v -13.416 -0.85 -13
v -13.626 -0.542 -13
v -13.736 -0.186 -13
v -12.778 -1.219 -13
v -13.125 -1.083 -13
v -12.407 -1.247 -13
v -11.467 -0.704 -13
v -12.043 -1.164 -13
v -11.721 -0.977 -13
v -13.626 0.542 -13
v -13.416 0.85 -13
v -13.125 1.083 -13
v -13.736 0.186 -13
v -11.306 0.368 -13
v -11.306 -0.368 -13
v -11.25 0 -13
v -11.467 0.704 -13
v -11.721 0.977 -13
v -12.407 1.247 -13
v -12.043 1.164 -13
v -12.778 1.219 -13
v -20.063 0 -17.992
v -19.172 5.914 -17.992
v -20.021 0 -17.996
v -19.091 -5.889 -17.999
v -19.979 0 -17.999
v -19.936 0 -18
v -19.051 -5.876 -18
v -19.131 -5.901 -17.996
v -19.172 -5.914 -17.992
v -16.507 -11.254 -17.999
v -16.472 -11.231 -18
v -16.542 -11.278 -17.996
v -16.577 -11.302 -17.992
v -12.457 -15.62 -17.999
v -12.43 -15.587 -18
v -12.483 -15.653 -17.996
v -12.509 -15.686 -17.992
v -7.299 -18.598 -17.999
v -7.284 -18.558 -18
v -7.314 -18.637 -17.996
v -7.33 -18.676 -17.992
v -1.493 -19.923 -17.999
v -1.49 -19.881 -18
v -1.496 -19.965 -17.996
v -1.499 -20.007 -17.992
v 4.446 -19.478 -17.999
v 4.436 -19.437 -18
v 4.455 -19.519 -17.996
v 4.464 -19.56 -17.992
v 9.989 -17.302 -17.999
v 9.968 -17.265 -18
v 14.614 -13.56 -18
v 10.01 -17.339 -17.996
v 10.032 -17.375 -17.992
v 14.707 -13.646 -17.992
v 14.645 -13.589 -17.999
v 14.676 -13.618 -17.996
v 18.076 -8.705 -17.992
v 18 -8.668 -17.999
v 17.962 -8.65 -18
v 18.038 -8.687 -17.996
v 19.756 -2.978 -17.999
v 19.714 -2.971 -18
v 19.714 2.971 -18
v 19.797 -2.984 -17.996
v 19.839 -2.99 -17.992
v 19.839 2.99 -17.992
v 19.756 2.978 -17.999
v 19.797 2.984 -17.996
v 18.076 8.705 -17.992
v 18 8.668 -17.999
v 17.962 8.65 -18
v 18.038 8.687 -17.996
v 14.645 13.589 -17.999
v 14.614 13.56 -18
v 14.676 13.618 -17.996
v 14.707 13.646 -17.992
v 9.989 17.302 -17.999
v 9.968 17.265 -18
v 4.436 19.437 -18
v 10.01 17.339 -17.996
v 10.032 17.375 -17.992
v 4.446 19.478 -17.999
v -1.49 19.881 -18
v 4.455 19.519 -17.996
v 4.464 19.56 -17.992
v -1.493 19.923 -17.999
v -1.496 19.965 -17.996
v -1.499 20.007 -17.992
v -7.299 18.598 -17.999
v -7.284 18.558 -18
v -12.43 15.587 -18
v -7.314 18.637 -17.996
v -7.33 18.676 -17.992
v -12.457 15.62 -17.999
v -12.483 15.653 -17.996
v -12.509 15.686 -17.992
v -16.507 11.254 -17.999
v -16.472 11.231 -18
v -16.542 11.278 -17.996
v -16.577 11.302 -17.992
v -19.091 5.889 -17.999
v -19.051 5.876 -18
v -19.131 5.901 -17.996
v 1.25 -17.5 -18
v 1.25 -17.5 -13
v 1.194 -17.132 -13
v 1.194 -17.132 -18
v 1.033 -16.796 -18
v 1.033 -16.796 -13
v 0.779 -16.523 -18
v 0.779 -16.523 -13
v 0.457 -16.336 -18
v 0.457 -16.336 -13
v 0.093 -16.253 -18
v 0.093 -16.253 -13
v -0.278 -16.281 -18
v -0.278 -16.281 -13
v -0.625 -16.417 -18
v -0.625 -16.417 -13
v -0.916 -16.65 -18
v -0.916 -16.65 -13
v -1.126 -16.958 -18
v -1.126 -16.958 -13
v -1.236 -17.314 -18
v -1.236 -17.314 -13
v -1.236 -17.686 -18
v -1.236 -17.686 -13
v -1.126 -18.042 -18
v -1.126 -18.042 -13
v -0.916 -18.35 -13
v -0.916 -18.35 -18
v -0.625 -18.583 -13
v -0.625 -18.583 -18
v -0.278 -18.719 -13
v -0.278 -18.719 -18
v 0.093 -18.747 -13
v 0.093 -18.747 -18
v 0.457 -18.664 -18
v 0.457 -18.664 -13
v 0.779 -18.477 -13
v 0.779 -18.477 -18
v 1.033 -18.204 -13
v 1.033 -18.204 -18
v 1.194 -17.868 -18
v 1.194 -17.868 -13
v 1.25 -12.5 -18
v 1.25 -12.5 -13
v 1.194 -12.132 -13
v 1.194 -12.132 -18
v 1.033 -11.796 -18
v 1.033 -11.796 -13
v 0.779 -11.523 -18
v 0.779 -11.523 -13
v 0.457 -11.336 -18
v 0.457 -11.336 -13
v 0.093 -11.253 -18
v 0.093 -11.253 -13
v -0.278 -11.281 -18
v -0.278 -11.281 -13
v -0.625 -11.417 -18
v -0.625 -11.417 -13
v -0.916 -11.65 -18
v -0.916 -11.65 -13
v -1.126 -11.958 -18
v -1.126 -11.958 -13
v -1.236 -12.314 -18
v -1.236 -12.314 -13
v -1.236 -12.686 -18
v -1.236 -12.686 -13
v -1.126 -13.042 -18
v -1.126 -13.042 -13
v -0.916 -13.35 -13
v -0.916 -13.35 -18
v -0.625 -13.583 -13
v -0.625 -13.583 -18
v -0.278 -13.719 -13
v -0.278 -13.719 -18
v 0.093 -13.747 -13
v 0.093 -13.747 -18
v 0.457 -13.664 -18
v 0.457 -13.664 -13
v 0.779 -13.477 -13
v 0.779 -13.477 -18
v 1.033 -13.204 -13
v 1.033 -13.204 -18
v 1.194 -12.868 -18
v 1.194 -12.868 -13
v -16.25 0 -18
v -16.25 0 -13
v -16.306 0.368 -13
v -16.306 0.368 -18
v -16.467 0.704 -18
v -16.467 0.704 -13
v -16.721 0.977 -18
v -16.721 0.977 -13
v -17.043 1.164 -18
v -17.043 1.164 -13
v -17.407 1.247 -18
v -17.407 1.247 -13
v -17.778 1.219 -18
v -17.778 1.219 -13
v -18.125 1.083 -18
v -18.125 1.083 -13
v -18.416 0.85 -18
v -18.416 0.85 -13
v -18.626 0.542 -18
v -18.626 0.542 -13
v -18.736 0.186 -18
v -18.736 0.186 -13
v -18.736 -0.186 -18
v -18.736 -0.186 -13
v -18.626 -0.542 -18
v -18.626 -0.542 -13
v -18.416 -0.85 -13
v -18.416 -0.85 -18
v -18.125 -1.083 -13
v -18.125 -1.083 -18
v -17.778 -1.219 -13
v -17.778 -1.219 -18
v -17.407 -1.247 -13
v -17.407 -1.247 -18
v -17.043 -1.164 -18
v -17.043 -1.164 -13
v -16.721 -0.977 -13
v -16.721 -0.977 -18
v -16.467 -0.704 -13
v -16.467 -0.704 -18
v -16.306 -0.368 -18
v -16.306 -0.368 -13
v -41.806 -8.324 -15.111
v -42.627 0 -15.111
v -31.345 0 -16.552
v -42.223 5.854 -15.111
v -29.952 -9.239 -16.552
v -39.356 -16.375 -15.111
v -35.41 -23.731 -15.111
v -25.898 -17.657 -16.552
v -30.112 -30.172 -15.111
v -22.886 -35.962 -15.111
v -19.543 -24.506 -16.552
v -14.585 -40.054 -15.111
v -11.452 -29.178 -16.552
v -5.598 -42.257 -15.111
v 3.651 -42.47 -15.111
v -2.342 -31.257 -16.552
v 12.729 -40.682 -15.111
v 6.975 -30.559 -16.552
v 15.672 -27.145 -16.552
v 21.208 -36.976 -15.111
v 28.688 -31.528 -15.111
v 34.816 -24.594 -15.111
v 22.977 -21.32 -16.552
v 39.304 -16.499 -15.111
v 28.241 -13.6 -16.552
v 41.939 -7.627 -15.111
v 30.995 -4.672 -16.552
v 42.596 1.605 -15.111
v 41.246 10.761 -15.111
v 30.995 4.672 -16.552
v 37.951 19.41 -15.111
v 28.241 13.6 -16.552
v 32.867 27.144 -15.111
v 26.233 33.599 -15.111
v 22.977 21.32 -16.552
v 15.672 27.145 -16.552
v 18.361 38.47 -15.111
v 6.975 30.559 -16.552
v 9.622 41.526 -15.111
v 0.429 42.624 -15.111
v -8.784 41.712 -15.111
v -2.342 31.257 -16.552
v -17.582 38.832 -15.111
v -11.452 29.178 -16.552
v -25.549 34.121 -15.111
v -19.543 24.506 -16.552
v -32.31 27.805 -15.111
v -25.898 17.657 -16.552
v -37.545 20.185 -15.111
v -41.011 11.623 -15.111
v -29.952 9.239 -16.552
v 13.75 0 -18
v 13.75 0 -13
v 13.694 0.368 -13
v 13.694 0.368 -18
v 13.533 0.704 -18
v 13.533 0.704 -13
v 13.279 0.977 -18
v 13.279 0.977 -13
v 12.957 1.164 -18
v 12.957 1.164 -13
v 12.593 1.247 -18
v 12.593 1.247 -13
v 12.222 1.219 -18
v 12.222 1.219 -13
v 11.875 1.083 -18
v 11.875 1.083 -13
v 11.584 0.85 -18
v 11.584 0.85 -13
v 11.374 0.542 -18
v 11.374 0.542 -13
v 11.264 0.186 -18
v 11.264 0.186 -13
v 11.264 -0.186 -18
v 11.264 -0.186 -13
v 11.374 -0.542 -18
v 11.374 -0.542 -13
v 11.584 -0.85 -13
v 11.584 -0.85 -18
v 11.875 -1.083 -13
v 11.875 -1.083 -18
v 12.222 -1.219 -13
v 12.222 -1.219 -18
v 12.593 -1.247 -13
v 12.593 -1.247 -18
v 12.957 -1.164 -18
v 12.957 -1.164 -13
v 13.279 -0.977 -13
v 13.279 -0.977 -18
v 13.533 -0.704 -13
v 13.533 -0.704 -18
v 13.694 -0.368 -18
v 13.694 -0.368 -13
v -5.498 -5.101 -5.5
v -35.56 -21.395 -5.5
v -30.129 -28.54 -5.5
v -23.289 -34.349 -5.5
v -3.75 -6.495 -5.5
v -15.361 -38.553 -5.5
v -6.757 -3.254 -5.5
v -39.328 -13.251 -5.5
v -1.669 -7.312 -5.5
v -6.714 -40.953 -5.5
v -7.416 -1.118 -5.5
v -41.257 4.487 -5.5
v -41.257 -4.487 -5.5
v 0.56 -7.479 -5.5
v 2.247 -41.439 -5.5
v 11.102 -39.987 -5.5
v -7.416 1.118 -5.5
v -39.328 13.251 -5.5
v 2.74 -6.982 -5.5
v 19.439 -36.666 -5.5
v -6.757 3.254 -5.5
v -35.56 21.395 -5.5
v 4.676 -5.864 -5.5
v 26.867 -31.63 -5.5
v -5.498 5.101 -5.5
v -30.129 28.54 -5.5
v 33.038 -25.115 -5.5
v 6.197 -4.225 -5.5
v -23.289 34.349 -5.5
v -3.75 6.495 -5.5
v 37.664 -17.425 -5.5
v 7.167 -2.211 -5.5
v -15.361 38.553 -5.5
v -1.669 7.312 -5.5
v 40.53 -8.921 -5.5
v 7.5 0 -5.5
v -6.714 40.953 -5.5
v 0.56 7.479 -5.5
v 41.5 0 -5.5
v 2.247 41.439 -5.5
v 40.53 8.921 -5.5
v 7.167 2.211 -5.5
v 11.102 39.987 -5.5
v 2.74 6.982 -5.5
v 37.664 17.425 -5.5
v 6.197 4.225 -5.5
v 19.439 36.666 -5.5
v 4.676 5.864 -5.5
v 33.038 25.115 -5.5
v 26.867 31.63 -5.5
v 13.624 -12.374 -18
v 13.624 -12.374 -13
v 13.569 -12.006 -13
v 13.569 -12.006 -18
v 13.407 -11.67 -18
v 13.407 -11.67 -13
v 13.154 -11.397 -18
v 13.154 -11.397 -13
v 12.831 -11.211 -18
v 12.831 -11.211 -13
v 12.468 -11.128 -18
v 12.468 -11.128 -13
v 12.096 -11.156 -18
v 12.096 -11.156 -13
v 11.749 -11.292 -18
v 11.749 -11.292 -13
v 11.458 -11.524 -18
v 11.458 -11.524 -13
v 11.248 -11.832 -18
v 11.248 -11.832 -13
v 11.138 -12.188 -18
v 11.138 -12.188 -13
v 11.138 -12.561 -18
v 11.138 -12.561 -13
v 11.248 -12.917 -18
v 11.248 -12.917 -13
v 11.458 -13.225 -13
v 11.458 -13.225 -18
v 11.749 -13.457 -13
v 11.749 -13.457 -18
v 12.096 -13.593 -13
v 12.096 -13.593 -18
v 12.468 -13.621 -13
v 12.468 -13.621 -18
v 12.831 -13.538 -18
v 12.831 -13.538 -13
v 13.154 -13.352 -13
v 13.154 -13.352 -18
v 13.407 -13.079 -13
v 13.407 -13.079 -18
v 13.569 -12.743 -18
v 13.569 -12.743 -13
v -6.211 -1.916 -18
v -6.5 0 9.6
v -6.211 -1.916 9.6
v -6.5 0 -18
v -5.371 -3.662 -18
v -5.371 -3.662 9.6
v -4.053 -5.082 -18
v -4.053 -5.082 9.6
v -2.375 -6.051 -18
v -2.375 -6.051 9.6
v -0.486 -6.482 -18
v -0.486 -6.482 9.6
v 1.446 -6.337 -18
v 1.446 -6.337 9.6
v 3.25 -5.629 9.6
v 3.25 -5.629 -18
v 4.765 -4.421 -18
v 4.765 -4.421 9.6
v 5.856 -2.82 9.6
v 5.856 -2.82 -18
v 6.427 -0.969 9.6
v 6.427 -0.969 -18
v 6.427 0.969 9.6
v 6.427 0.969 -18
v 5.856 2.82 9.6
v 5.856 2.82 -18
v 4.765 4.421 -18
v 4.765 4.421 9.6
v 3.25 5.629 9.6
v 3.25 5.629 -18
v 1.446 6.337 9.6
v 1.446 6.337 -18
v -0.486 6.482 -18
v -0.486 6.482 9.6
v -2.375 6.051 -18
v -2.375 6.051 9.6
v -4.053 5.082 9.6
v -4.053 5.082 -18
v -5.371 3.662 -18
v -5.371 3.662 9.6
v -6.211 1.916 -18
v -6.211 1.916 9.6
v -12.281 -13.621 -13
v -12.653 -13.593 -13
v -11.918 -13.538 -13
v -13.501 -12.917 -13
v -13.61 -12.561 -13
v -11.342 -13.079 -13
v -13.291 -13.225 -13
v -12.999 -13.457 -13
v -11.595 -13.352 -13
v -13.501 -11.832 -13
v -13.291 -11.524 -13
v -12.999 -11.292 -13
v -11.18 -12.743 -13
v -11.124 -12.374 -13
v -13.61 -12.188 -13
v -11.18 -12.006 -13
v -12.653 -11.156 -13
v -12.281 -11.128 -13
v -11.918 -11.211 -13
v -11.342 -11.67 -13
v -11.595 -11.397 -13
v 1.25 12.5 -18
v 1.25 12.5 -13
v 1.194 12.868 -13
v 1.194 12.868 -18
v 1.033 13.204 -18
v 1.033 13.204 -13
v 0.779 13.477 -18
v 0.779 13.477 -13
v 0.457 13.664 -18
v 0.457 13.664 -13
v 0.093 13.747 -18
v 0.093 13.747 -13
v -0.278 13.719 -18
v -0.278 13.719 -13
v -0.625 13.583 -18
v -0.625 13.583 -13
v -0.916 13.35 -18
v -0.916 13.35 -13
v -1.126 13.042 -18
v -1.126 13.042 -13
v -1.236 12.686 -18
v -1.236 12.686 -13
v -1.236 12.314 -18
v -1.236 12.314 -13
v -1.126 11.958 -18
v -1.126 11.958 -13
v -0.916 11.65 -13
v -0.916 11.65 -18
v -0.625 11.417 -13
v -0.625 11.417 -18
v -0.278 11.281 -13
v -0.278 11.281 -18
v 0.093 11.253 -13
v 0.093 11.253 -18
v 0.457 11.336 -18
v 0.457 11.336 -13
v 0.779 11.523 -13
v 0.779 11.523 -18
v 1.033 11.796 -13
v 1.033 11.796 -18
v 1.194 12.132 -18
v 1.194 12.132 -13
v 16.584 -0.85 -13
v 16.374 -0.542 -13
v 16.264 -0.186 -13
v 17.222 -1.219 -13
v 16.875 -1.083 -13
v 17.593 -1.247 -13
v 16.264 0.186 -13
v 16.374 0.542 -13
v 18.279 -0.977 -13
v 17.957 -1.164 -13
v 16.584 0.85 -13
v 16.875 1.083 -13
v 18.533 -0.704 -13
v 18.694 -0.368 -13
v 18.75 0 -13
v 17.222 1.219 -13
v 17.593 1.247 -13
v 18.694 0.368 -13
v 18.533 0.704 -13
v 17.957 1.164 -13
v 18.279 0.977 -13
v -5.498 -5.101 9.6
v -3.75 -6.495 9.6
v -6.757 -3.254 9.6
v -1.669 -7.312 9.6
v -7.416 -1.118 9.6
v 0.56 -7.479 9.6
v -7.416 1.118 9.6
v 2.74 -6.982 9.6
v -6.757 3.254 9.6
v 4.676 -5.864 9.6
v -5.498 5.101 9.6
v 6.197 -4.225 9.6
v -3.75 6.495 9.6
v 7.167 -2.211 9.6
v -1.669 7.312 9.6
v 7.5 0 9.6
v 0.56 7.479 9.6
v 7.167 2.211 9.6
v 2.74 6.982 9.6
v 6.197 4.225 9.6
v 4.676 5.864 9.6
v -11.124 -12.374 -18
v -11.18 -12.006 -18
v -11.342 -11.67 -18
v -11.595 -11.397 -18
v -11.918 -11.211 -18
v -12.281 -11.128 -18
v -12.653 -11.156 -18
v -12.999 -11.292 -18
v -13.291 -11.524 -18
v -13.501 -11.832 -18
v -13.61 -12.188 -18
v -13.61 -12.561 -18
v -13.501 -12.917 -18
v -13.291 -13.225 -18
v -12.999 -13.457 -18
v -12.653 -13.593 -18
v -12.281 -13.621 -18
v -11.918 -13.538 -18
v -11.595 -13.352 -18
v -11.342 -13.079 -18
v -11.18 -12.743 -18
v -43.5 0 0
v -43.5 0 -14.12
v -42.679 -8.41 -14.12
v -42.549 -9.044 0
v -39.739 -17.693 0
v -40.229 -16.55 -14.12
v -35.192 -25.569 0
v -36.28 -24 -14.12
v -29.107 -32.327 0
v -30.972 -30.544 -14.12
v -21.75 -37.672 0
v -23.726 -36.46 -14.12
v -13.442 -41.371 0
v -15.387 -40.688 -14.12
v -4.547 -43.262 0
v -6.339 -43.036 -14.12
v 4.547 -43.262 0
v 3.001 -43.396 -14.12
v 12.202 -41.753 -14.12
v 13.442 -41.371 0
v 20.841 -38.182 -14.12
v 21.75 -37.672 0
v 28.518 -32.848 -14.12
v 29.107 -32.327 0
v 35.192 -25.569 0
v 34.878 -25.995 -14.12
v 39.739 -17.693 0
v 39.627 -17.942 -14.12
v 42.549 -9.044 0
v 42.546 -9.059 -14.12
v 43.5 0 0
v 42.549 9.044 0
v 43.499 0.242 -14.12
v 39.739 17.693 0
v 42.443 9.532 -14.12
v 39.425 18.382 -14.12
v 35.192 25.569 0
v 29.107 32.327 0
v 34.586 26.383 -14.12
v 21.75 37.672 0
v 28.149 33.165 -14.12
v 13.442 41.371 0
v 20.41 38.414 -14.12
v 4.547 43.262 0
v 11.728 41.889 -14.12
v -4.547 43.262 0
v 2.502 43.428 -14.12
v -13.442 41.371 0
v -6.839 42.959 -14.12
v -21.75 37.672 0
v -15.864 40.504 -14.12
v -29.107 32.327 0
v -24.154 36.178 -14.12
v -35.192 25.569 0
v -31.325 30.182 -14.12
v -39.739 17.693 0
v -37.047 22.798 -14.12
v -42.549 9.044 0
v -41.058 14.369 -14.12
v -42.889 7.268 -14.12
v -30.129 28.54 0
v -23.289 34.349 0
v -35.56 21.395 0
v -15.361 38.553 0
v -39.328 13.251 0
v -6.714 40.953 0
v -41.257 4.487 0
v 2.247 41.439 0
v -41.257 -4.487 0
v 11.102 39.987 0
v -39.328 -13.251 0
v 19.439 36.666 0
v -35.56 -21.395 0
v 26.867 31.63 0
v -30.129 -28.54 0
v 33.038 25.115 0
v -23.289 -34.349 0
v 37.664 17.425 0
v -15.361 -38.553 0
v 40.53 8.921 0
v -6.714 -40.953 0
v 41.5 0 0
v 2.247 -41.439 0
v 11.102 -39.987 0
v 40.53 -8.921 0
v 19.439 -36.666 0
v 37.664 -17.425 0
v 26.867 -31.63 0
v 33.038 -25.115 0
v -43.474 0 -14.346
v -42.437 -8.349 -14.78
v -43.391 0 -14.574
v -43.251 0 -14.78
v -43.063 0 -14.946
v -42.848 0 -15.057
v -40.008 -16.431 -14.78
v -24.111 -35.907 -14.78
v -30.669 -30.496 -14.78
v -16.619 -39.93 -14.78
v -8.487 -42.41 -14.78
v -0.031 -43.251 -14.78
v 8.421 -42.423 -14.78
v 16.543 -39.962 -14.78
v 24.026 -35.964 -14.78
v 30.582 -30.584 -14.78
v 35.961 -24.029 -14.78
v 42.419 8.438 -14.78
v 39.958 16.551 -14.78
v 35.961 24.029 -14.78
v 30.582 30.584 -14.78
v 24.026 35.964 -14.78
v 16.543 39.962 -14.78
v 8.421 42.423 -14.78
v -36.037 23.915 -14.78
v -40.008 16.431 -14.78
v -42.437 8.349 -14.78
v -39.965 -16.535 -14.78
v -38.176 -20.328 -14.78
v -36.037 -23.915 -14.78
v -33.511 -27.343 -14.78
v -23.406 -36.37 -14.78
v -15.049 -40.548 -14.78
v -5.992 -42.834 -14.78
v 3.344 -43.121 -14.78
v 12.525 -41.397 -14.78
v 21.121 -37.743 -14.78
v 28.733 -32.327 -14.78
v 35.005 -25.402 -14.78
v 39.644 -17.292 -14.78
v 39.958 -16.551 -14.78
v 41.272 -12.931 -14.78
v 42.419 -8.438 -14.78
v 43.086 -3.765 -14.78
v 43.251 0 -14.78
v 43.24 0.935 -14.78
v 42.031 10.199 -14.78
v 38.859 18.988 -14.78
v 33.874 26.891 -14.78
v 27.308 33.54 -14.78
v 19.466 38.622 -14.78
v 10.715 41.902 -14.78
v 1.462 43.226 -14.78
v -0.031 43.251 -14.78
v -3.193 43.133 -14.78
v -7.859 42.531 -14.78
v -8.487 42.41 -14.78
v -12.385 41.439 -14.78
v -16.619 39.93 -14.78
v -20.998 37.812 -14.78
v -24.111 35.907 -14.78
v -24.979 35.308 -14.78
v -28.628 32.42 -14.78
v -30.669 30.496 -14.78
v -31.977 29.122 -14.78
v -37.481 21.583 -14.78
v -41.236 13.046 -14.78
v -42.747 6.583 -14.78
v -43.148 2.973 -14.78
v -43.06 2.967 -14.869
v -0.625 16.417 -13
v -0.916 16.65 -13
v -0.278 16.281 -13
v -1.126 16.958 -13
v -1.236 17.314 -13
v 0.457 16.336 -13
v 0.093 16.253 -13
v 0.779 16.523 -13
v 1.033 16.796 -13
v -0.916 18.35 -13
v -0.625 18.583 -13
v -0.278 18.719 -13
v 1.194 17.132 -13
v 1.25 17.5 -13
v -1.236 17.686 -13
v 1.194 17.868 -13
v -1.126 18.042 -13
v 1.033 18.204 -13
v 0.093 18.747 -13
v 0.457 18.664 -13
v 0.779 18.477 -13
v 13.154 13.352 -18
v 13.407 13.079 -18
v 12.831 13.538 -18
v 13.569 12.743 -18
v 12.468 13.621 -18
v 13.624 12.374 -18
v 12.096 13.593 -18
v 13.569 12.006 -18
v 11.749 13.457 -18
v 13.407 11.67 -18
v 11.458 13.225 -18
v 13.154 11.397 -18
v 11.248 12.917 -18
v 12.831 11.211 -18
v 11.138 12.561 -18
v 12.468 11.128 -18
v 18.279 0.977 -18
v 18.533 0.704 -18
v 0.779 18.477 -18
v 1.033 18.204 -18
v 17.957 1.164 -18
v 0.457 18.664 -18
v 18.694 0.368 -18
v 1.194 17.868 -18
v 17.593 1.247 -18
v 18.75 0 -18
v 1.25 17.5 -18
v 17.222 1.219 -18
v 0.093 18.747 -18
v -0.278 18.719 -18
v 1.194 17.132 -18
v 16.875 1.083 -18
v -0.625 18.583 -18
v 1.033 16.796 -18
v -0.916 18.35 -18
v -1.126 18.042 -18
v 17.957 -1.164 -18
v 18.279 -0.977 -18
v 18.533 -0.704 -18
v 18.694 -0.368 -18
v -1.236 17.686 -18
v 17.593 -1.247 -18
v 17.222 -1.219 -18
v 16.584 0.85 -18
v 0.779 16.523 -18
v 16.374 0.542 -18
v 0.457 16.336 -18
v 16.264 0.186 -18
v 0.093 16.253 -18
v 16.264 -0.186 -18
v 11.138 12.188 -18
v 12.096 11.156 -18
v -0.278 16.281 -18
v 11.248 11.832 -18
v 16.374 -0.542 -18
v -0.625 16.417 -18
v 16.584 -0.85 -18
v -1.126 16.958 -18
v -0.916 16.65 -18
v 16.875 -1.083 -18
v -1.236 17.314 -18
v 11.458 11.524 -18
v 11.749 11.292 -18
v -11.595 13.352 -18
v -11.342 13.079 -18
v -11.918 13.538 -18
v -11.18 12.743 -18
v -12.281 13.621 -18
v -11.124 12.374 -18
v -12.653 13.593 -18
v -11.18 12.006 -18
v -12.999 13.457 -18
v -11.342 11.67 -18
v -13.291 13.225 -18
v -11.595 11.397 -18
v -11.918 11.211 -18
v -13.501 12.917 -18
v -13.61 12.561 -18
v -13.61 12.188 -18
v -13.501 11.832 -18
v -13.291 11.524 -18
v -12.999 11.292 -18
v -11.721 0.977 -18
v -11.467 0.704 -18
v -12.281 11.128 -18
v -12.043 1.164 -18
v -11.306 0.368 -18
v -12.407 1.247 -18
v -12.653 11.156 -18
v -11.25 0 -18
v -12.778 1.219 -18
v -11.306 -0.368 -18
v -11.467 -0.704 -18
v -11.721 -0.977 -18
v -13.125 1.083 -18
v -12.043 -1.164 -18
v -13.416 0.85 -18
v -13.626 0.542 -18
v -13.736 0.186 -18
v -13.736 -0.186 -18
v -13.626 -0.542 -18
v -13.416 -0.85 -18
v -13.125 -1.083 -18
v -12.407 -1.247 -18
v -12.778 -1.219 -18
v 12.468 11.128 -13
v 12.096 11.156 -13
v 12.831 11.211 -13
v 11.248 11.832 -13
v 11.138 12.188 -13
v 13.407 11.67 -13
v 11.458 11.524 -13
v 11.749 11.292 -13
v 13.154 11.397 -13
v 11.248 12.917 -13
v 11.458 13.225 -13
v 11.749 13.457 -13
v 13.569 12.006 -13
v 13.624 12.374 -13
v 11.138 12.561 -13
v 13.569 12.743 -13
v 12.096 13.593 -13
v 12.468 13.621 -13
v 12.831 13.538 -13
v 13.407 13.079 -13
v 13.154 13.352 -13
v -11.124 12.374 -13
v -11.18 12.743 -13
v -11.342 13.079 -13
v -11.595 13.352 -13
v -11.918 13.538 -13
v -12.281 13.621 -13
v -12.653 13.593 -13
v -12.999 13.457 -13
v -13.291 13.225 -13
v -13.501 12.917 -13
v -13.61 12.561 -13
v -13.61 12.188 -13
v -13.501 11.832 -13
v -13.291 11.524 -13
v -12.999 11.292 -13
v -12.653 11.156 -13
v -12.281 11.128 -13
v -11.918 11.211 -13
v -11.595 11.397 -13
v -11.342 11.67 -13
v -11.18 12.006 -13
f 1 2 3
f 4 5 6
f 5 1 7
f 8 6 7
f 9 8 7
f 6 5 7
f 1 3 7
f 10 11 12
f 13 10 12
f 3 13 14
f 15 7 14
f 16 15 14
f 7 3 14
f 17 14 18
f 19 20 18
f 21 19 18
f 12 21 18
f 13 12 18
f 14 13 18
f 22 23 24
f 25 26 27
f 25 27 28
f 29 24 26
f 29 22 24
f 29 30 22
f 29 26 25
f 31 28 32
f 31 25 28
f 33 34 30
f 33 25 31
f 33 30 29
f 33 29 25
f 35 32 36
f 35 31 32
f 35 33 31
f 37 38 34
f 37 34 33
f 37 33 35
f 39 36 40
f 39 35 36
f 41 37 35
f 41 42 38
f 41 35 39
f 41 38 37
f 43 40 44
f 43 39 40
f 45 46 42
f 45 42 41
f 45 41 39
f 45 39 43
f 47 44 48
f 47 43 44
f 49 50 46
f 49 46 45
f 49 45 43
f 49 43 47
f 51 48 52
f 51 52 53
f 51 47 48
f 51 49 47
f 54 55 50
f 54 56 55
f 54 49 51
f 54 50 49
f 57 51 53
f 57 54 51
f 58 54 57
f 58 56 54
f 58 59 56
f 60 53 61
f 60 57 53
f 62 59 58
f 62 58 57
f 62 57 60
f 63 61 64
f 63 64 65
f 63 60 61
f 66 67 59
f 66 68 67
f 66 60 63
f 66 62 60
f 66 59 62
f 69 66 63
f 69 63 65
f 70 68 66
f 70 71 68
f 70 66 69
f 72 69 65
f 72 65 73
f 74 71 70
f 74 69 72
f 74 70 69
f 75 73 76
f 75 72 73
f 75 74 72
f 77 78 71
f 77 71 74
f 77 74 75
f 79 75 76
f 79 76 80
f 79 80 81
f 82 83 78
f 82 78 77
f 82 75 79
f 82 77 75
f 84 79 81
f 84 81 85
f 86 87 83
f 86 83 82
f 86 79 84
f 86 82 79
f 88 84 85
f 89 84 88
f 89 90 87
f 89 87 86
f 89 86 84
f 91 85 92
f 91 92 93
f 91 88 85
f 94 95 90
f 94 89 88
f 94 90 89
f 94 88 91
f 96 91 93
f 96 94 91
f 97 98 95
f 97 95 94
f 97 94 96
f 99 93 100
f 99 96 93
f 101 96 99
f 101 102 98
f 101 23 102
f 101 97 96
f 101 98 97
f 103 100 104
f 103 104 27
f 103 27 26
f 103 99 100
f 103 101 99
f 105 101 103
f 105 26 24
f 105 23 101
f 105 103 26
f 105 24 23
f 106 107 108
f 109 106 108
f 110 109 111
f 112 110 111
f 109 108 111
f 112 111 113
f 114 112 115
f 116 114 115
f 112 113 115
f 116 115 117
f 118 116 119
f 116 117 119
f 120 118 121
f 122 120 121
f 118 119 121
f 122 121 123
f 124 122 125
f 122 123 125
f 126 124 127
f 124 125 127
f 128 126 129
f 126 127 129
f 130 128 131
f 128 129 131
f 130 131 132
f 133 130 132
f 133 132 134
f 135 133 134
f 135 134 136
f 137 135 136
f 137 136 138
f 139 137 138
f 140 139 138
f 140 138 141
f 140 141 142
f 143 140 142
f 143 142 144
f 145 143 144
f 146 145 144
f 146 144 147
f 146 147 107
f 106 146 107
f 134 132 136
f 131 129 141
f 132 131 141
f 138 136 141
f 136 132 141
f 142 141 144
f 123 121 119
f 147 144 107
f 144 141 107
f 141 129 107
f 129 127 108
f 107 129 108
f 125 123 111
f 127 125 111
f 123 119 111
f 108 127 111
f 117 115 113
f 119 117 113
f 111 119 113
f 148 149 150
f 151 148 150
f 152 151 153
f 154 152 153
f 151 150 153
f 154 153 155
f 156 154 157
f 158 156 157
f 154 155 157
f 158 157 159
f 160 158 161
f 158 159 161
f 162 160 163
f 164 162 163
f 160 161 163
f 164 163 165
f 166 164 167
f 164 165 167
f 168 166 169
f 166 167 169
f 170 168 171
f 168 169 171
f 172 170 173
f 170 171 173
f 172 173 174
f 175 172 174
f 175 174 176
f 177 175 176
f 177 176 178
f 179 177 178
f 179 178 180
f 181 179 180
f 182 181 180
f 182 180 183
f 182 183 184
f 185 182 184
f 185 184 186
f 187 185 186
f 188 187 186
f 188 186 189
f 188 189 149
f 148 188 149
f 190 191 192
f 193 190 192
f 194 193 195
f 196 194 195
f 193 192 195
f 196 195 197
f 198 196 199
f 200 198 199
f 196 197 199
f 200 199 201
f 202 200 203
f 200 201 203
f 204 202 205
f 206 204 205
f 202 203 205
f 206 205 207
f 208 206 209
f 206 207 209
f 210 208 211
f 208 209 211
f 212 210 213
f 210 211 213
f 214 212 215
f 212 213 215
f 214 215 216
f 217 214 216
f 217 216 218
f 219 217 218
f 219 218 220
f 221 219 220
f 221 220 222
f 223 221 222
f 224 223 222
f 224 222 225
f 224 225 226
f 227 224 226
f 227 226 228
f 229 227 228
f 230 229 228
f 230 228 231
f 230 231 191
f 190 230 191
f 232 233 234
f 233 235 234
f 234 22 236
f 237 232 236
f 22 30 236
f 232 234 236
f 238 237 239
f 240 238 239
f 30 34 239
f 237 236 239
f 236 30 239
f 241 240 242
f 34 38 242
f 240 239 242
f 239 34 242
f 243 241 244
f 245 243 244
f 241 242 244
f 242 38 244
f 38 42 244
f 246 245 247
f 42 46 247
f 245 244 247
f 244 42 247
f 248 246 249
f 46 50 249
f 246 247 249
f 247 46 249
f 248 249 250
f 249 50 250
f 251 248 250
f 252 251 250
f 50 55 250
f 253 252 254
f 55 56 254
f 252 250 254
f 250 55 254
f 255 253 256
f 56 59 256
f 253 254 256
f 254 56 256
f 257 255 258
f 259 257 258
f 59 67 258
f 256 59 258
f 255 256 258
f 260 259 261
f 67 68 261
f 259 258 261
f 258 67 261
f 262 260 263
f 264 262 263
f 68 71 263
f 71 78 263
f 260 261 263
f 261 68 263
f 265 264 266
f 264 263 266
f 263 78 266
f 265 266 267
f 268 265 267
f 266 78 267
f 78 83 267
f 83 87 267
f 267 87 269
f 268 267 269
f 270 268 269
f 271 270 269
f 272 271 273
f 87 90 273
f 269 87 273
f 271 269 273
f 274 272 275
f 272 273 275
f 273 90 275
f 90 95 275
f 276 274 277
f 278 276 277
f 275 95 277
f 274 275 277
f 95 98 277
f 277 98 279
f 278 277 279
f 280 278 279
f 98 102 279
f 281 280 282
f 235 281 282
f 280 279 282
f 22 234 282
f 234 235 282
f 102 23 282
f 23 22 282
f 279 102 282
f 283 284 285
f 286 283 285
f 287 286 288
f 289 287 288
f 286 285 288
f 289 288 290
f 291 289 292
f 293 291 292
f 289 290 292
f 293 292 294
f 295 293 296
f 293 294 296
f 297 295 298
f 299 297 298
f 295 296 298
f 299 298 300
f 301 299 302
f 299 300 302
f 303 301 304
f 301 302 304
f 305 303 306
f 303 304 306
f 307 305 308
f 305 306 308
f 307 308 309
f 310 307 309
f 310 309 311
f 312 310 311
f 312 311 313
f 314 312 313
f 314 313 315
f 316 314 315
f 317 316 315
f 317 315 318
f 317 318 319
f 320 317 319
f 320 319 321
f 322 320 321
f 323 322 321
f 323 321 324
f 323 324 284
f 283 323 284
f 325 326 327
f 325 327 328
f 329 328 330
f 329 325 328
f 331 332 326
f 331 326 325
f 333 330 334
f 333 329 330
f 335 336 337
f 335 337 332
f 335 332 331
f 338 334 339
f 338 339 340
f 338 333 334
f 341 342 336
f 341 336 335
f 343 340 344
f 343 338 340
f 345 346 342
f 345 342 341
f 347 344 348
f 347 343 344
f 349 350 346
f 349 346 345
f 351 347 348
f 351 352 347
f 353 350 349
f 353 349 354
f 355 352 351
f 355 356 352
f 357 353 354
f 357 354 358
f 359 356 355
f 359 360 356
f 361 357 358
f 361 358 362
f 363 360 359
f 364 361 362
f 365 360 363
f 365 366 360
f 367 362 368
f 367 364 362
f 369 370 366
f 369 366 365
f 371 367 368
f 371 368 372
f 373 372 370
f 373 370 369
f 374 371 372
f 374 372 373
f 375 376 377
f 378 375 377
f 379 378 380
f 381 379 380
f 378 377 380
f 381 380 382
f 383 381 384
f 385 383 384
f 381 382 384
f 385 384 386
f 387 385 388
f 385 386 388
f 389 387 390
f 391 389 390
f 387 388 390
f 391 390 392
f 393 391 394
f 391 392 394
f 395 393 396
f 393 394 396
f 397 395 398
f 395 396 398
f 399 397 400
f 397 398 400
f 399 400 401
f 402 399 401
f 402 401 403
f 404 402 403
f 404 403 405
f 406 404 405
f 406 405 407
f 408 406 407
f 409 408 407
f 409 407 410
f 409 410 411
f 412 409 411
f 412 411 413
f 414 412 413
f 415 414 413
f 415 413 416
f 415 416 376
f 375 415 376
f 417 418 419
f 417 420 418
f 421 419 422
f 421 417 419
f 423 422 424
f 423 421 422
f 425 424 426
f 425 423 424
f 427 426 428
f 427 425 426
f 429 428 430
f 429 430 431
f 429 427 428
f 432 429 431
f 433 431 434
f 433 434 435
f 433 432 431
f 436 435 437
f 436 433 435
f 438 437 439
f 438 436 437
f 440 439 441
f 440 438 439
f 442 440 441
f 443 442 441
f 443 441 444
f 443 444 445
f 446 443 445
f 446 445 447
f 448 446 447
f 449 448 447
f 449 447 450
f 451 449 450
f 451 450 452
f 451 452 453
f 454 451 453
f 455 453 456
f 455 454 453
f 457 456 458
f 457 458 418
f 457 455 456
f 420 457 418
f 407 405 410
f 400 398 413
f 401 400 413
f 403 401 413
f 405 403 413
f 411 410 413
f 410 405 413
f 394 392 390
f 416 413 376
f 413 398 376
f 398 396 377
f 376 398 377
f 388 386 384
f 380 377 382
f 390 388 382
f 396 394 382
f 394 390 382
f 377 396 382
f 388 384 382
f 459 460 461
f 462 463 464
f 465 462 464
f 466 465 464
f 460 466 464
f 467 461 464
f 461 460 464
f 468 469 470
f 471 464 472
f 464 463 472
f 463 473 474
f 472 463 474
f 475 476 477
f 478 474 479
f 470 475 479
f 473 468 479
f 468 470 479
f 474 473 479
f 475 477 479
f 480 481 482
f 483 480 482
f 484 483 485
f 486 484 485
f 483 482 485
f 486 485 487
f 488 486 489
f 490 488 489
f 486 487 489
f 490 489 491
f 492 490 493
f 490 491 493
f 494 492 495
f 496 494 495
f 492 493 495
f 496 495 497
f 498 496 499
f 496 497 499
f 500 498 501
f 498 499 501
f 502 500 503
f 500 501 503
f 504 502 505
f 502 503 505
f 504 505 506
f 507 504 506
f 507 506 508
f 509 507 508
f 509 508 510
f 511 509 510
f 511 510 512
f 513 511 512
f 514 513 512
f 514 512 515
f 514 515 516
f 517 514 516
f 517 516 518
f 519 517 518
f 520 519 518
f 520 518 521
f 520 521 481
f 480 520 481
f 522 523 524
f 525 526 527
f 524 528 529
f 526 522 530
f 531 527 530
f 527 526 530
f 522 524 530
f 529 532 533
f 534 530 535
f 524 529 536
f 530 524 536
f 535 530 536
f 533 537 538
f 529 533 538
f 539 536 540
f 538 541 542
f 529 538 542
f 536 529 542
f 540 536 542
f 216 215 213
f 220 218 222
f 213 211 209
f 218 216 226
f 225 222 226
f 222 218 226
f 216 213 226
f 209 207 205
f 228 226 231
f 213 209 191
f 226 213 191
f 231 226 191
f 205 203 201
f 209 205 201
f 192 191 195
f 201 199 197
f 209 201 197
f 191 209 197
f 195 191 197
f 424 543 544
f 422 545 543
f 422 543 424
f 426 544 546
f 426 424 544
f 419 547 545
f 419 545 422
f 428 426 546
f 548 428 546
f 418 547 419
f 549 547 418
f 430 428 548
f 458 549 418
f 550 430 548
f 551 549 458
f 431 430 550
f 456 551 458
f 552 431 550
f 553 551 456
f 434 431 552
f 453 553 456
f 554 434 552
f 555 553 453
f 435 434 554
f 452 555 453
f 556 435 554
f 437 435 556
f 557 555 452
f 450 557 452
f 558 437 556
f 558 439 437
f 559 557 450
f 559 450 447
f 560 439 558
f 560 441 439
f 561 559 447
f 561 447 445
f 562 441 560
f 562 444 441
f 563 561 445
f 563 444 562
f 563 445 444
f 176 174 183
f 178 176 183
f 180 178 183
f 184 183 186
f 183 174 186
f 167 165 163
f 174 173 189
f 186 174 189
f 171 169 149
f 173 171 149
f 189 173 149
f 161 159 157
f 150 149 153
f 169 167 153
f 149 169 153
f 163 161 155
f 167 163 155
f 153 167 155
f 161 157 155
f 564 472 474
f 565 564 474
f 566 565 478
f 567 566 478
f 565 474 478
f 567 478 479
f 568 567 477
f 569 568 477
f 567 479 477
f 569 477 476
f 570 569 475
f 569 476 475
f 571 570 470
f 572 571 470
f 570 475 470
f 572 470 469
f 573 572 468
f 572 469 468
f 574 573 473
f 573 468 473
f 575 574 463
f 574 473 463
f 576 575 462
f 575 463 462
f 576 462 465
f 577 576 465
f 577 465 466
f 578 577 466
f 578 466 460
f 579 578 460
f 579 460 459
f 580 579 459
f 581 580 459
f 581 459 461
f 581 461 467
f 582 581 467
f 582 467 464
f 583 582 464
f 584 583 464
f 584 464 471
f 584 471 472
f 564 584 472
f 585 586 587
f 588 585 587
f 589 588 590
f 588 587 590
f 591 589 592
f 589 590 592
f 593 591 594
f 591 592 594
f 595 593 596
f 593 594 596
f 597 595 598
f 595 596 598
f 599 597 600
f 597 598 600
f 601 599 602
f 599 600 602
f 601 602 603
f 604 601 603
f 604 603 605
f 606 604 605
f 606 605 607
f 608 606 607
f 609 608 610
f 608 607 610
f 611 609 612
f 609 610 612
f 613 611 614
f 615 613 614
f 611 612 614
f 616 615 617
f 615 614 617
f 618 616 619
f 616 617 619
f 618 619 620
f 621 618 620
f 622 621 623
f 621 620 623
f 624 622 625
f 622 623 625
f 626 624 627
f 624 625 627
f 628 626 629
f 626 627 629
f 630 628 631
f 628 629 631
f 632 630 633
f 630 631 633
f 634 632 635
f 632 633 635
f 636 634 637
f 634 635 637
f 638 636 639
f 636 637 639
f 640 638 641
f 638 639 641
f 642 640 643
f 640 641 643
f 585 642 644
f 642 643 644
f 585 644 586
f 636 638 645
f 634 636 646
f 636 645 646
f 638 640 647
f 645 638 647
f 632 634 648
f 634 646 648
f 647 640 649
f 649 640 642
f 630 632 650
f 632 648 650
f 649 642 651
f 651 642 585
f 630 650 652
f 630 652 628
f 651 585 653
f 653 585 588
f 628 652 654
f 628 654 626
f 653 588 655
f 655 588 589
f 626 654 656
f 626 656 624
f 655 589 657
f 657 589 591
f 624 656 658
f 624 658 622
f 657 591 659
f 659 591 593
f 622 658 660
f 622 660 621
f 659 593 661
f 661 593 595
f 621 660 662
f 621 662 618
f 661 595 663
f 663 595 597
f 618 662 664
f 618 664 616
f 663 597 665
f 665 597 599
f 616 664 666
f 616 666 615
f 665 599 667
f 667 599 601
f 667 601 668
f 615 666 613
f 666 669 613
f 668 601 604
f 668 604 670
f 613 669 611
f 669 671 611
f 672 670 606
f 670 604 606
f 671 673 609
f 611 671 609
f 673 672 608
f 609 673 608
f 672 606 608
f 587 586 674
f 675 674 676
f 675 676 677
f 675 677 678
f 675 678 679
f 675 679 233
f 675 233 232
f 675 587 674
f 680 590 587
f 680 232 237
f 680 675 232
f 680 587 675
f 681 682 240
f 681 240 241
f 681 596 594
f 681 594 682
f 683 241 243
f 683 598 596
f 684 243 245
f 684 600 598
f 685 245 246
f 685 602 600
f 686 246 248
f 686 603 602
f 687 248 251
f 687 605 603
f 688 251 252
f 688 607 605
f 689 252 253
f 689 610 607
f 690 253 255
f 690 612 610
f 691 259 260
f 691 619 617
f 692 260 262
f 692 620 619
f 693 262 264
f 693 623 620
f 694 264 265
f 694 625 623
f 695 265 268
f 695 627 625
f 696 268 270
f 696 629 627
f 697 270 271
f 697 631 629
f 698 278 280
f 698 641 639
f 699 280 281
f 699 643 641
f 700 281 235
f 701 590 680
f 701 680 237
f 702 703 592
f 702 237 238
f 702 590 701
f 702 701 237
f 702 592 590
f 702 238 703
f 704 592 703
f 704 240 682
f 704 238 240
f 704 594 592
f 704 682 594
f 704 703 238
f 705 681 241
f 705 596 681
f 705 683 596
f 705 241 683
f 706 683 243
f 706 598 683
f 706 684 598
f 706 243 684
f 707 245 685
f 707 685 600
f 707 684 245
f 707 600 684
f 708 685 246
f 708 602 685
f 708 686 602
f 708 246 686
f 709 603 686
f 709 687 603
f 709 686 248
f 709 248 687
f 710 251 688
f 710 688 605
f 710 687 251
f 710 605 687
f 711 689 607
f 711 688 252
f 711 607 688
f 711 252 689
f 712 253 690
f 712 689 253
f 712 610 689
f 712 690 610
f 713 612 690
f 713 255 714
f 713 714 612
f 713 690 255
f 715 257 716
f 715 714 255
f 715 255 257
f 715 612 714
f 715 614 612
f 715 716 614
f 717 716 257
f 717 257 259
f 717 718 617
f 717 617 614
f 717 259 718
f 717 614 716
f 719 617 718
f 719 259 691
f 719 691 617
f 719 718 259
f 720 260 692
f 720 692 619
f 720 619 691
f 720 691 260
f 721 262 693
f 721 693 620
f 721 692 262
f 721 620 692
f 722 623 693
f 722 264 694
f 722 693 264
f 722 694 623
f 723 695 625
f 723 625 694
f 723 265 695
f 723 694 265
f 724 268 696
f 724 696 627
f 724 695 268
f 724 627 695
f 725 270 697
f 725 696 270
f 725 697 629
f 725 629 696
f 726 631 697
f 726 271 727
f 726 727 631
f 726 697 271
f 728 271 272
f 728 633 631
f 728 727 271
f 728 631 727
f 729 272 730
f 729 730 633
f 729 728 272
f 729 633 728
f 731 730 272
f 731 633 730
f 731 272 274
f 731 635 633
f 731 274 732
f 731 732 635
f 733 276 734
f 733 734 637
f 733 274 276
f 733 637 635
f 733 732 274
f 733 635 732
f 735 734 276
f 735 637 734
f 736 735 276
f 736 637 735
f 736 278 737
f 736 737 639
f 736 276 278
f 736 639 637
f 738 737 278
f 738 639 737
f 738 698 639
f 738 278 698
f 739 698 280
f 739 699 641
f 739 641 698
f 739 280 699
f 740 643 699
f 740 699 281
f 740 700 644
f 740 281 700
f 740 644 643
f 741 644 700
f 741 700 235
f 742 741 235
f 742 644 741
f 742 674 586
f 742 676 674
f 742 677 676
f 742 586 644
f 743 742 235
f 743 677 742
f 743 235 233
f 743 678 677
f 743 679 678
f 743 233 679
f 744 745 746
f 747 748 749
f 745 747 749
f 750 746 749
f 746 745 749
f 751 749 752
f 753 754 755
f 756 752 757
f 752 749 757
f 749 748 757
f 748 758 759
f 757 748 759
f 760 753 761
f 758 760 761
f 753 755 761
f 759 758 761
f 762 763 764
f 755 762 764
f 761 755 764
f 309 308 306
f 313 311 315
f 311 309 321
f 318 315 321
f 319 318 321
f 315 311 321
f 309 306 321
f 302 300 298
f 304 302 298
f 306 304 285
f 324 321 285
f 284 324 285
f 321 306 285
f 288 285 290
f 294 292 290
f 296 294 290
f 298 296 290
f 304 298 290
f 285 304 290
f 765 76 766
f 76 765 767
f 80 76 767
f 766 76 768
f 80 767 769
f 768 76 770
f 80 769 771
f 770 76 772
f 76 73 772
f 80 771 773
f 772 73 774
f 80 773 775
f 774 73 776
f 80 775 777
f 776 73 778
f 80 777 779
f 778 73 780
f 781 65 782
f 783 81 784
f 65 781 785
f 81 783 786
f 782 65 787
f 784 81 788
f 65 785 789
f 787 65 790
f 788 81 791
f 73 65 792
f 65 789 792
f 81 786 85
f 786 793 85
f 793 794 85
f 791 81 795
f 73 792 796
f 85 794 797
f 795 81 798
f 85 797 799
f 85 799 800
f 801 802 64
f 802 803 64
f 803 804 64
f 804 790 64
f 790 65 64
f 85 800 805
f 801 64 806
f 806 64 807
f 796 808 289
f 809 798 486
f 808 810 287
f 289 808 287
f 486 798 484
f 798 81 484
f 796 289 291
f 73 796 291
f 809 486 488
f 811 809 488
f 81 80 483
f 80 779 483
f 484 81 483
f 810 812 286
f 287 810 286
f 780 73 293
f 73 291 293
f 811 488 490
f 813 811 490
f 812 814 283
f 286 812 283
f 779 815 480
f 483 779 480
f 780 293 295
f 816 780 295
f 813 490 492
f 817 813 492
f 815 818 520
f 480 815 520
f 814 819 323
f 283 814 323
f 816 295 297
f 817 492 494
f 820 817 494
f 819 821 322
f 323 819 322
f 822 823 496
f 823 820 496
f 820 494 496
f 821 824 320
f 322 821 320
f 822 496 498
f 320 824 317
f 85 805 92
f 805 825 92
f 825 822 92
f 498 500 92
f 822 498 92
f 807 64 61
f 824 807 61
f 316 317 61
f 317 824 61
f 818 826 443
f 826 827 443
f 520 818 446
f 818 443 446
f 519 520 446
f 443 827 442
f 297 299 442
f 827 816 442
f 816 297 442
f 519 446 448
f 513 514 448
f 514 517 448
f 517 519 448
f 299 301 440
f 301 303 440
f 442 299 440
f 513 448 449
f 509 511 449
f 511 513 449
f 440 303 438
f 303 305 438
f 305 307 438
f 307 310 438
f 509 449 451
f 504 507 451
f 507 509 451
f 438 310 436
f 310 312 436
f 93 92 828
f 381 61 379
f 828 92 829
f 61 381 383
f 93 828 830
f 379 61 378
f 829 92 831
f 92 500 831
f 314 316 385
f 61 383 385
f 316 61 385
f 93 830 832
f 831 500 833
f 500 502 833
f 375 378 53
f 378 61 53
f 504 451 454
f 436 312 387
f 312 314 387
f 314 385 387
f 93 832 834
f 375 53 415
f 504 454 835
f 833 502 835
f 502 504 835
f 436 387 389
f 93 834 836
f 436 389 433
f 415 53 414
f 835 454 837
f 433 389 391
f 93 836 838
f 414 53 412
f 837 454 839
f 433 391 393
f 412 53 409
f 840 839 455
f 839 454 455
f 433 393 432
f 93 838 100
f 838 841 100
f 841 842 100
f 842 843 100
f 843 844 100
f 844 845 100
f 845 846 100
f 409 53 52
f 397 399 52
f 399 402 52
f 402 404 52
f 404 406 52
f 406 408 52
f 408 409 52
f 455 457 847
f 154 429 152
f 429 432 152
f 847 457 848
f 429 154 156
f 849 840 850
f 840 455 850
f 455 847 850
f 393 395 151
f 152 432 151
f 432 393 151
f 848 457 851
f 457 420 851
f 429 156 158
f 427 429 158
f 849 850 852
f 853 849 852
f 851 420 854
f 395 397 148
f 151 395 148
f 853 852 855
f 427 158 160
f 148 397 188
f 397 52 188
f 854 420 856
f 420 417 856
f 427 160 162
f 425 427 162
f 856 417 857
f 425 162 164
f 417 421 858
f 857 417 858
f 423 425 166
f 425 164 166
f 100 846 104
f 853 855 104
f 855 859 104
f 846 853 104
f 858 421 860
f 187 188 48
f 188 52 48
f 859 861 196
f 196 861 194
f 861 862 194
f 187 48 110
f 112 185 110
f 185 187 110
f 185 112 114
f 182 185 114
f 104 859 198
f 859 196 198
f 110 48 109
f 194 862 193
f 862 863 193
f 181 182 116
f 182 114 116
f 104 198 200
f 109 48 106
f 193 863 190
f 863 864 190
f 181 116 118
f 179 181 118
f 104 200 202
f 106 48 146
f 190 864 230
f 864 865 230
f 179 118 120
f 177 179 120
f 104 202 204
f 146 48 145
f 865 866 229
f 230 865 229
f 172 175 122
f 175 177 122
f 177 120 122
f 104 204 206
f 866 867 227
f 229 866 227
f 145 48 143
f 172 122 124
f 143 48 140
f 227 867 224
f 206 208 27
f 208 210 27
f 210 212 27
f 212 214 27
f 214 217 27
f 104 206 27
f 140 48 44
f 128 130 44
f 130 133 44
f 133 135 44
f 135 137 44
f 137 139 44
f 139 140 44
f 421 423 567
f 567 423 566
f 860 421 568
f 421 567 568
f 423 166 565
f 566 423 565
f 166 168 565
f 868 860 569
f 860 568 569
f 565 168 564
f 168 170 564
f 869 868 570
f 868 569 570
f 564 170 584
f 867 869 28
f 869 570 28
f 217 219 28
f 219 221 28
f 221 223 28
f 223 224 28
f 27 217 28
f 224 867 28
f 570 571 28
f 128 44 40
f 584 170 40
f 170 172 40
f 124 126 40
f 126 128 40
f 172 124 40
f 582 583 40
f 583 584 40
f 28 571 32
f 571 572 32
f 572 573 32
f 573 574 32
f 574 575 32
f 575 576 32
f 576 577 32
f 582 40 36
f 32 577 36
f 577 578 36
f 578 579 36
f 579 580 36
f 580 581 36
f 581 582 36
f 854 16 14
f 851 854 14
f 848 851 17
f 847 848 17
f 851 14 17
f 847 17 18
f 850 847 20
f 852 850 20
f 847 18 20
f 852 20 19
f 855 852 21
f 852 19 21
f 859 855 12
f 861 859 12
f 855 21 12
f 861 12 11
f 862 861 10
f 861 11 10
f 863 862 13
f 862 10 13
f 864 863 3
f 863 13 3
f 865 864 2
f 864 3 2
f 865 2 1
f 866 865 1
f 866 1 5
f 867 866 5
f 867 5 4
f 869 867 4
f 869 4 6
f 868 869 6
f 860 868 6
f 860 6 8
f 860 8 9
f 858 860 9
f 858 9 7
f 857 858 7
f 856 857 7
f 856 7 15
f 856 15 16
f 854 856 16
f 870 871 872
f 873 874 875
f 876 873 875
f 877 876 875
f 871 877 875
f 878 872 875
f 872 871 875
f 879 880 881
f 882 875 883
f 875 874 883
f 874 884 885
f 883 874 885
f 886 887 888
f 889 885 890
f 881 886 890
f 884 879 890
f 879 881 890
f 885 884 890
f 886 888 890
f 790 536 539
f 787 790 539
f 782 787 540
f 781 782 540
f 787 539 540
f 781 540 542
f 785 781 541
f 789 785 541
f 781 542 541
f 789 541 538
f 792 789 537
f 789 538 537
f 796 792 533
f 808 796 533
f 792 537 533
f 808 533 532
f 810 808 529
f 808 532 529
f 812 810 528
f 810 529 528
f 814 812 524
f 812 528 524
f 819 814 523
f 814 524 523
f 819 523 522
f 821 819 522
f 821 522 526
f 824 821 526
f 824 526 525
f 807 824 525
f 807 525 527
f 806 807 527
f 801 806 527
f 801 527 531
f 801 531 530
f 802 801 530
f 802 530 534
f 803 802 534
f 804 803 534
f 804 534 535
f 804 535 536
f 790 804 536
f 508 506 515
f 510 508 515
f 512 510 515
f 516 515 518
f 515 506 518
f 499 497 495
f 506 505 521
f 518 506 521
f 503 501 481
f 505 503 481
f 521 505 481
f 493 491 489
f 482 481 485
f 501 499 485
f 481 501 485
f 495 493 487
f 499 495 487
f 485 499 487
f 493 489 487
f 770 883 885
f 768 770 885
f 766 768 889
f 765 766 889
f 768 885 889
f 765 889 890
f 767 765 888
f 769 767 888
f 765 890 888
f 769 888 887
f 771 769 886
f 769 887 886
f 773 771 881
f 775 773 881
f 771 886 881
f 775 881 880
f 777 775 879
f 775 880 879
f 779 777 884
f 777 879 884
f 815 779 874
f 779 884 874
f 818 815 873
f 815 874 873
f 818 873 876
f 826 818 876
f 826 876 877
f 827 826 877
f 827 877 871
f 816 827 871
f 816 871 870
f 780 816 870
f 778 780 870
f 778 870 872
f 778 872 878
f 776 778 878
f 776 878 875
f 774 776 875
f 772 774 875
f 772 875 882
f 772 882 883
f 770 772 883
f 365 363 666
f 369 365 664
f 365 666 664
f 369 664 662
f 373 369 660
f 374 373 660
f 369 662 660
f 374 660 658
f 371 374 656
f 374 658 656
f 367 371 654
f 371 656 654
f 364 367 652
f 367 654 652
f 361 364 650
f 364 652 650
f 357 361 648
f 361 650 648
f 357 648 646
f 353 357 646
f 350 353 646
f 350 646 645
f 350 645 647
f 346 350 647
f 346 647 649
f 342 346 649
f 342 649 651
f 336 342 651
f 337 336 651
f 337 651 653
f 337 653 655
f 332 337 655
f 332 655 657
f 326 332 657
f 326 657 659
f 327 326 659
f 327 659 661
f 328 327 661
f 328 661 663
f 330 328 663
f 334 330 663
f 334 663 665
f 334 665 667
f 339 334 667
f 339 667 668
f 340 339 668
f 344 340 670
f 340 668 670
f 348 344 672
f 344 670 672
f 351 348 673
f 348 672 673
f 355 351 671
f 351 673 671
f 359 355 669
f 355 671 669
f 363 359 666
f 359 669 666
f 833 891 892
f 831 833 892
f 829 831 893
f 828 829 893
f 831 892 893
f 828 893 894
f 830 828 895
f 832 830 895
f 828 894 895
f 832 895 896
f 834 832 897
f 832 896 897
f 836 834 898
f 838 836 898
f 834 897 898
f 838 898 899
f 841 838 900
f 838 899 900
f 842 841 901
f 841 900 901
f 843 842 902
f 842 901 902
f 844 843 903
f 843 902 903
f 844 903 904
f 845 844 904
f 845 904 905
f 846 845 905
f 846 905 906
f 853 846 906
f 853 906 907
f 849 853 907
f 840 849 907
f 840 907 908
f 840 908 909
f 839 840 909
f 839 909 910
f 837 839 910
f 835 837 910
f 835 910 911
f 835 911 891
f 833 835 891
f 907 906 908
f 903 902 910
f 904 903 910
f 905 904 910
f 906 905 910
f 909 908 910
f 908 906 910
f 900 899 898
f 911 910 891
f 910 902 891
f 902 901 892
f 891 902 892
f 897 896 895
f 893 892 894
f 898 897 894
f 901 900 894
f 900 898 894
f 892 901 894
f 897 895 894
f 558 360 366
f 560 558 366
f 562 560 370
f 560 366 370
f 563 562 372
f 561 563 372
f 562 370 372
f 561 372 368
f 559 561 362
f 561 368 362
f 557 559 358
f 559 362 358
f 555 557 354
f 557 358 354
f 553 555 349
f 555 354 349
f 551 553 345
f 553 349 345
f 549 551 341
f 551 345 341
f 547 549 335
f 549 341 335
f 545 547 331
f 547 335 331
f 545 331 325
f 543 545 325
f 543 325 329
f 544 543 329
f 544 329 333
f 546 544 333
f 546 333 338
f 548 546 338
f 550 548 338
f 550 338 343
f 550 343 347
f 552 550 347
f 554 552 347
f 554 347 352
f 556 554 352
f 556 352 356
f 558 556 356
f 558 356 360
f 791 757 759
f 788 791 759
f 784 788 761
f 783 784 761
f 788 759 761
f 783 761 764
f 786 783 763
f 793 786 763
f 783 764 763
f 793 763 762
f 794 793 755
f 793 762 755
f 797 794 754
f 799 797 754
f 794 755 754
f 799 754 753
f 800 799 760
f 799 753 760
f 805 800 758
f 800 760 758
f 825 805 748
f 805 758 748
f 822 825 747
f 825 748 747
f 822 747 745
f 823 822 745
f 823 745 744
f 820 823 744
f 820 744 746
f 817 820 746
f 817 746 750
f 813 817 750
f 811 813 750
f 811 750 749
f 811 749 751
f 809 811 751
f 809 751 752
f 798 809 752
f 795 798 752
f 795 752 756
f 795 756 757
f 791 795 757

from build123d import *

# Parameters (mm, degrees)
SKETCH_2_R          = 41.5
CUT_EXTRUDE_1_DEPTH = 13
SKETCH_3_R          = 6.5
CUT_EXTRUDE_2_DEPTH = 65.097581858
SKETCH_4_R          = 7.5
SKETCH_4_R_2        = 6.5
EXTRUDE_1_DEPTH     = 22.6
M3X0_51_D           = 2.5
FILLET_1_R          = 1
SKETCH_8_R          = 41.5
SKETCH_8_R_2        = 7.5
EXTRUDE_2_DEPTH     = 7.5


with BuildPart() as part:
    # Эскиз1 → Повернуть1 (revolve)
    with BuildSketch(Plane(origin=(0, 0, 0), x_dir=(1, 0, 0), z_dir=(0, 1, 0))):
        Polygon((0, 0), (-43.5, 0), (-43.5, 15), (-20, 18), (0, 18), align=None)
    revolve(axis=Axis((0, 0, -18), (0, 0, 1)))

    # Эскиз2 → Вырез-Вытянуть1 (cut)
    with BuildSketch(Plane.XY):
        Circle(SKETCH_2_R)
    extrude(amount=-CUT_EXTRUDE_1_DEPTH, mode=Mode.SUBTRACT)

    # Эскиз3 → Вырез-Вытянуть2 (cut, through all)
    with BuildSketch(Plane(origin=(0, 0, -18), x_dir=(-1, 0, 0), z_dir=(0, 0, -1))):
        Circle(SKETCH_3_R)
    extrude(amount=-CUT_EXTRUDE_2_DEPTH, mode=Mode.SUBTRACT)

    # Эскиз4 → Бобышка-Вытянуть1 (add)
    with BuildSketch(Plane.XY.offset(-13)):
        Circle(SKETCH_4_R)
        with Locations(Location((0, 0, 0), (0, 0, 180))):
            Circle(SKETCH_4_R_2, mode=Mode.SUBTRACT)
    extrude(amount=EXTRUDE_1_DEPTH)

    # Отверстие обработанное метчиком M3x0.51 (through all)
    with Locations(Plane(origin=(0, 0, -18), x_dir=(-1, 0, 0), z_dir=(0, 0, -1))):
        with Locations((-12.374368671, 12.374368671), (0, 17.5), (12.374368671, 12.374368671), (17.5, 0), (12.374368671, -12.374368671), (0, -17.5), (-12.374368671, -12.374368671), (-17.5, 0), (-12.5, 0), (0, 12.5), (12.5, 0), (0, -12.5)):
            Hole(M3X0_51_D / 2)

    # Скругление1
    fillet_1_edges = [part.edges().sort_by_distance(p)[0] for p in [
        (20, 0, -18),
        (43.5, 0, -15),
    ]]
    fillet(fillet_1_edges, radius=FILLET_1_R)

    # Эскиз8 → Бобышка-Вытянуть2 (add)
    with BuildSketch(Plane.XY.offset(-13)):
        Circle(SKETCH_8_R)
        Circle(SKETCH_8_R_2, mode=Mode.SUBTRACT)
    extrude(amount=EXTRUDE_2_DEPTH)


solid = part.part
